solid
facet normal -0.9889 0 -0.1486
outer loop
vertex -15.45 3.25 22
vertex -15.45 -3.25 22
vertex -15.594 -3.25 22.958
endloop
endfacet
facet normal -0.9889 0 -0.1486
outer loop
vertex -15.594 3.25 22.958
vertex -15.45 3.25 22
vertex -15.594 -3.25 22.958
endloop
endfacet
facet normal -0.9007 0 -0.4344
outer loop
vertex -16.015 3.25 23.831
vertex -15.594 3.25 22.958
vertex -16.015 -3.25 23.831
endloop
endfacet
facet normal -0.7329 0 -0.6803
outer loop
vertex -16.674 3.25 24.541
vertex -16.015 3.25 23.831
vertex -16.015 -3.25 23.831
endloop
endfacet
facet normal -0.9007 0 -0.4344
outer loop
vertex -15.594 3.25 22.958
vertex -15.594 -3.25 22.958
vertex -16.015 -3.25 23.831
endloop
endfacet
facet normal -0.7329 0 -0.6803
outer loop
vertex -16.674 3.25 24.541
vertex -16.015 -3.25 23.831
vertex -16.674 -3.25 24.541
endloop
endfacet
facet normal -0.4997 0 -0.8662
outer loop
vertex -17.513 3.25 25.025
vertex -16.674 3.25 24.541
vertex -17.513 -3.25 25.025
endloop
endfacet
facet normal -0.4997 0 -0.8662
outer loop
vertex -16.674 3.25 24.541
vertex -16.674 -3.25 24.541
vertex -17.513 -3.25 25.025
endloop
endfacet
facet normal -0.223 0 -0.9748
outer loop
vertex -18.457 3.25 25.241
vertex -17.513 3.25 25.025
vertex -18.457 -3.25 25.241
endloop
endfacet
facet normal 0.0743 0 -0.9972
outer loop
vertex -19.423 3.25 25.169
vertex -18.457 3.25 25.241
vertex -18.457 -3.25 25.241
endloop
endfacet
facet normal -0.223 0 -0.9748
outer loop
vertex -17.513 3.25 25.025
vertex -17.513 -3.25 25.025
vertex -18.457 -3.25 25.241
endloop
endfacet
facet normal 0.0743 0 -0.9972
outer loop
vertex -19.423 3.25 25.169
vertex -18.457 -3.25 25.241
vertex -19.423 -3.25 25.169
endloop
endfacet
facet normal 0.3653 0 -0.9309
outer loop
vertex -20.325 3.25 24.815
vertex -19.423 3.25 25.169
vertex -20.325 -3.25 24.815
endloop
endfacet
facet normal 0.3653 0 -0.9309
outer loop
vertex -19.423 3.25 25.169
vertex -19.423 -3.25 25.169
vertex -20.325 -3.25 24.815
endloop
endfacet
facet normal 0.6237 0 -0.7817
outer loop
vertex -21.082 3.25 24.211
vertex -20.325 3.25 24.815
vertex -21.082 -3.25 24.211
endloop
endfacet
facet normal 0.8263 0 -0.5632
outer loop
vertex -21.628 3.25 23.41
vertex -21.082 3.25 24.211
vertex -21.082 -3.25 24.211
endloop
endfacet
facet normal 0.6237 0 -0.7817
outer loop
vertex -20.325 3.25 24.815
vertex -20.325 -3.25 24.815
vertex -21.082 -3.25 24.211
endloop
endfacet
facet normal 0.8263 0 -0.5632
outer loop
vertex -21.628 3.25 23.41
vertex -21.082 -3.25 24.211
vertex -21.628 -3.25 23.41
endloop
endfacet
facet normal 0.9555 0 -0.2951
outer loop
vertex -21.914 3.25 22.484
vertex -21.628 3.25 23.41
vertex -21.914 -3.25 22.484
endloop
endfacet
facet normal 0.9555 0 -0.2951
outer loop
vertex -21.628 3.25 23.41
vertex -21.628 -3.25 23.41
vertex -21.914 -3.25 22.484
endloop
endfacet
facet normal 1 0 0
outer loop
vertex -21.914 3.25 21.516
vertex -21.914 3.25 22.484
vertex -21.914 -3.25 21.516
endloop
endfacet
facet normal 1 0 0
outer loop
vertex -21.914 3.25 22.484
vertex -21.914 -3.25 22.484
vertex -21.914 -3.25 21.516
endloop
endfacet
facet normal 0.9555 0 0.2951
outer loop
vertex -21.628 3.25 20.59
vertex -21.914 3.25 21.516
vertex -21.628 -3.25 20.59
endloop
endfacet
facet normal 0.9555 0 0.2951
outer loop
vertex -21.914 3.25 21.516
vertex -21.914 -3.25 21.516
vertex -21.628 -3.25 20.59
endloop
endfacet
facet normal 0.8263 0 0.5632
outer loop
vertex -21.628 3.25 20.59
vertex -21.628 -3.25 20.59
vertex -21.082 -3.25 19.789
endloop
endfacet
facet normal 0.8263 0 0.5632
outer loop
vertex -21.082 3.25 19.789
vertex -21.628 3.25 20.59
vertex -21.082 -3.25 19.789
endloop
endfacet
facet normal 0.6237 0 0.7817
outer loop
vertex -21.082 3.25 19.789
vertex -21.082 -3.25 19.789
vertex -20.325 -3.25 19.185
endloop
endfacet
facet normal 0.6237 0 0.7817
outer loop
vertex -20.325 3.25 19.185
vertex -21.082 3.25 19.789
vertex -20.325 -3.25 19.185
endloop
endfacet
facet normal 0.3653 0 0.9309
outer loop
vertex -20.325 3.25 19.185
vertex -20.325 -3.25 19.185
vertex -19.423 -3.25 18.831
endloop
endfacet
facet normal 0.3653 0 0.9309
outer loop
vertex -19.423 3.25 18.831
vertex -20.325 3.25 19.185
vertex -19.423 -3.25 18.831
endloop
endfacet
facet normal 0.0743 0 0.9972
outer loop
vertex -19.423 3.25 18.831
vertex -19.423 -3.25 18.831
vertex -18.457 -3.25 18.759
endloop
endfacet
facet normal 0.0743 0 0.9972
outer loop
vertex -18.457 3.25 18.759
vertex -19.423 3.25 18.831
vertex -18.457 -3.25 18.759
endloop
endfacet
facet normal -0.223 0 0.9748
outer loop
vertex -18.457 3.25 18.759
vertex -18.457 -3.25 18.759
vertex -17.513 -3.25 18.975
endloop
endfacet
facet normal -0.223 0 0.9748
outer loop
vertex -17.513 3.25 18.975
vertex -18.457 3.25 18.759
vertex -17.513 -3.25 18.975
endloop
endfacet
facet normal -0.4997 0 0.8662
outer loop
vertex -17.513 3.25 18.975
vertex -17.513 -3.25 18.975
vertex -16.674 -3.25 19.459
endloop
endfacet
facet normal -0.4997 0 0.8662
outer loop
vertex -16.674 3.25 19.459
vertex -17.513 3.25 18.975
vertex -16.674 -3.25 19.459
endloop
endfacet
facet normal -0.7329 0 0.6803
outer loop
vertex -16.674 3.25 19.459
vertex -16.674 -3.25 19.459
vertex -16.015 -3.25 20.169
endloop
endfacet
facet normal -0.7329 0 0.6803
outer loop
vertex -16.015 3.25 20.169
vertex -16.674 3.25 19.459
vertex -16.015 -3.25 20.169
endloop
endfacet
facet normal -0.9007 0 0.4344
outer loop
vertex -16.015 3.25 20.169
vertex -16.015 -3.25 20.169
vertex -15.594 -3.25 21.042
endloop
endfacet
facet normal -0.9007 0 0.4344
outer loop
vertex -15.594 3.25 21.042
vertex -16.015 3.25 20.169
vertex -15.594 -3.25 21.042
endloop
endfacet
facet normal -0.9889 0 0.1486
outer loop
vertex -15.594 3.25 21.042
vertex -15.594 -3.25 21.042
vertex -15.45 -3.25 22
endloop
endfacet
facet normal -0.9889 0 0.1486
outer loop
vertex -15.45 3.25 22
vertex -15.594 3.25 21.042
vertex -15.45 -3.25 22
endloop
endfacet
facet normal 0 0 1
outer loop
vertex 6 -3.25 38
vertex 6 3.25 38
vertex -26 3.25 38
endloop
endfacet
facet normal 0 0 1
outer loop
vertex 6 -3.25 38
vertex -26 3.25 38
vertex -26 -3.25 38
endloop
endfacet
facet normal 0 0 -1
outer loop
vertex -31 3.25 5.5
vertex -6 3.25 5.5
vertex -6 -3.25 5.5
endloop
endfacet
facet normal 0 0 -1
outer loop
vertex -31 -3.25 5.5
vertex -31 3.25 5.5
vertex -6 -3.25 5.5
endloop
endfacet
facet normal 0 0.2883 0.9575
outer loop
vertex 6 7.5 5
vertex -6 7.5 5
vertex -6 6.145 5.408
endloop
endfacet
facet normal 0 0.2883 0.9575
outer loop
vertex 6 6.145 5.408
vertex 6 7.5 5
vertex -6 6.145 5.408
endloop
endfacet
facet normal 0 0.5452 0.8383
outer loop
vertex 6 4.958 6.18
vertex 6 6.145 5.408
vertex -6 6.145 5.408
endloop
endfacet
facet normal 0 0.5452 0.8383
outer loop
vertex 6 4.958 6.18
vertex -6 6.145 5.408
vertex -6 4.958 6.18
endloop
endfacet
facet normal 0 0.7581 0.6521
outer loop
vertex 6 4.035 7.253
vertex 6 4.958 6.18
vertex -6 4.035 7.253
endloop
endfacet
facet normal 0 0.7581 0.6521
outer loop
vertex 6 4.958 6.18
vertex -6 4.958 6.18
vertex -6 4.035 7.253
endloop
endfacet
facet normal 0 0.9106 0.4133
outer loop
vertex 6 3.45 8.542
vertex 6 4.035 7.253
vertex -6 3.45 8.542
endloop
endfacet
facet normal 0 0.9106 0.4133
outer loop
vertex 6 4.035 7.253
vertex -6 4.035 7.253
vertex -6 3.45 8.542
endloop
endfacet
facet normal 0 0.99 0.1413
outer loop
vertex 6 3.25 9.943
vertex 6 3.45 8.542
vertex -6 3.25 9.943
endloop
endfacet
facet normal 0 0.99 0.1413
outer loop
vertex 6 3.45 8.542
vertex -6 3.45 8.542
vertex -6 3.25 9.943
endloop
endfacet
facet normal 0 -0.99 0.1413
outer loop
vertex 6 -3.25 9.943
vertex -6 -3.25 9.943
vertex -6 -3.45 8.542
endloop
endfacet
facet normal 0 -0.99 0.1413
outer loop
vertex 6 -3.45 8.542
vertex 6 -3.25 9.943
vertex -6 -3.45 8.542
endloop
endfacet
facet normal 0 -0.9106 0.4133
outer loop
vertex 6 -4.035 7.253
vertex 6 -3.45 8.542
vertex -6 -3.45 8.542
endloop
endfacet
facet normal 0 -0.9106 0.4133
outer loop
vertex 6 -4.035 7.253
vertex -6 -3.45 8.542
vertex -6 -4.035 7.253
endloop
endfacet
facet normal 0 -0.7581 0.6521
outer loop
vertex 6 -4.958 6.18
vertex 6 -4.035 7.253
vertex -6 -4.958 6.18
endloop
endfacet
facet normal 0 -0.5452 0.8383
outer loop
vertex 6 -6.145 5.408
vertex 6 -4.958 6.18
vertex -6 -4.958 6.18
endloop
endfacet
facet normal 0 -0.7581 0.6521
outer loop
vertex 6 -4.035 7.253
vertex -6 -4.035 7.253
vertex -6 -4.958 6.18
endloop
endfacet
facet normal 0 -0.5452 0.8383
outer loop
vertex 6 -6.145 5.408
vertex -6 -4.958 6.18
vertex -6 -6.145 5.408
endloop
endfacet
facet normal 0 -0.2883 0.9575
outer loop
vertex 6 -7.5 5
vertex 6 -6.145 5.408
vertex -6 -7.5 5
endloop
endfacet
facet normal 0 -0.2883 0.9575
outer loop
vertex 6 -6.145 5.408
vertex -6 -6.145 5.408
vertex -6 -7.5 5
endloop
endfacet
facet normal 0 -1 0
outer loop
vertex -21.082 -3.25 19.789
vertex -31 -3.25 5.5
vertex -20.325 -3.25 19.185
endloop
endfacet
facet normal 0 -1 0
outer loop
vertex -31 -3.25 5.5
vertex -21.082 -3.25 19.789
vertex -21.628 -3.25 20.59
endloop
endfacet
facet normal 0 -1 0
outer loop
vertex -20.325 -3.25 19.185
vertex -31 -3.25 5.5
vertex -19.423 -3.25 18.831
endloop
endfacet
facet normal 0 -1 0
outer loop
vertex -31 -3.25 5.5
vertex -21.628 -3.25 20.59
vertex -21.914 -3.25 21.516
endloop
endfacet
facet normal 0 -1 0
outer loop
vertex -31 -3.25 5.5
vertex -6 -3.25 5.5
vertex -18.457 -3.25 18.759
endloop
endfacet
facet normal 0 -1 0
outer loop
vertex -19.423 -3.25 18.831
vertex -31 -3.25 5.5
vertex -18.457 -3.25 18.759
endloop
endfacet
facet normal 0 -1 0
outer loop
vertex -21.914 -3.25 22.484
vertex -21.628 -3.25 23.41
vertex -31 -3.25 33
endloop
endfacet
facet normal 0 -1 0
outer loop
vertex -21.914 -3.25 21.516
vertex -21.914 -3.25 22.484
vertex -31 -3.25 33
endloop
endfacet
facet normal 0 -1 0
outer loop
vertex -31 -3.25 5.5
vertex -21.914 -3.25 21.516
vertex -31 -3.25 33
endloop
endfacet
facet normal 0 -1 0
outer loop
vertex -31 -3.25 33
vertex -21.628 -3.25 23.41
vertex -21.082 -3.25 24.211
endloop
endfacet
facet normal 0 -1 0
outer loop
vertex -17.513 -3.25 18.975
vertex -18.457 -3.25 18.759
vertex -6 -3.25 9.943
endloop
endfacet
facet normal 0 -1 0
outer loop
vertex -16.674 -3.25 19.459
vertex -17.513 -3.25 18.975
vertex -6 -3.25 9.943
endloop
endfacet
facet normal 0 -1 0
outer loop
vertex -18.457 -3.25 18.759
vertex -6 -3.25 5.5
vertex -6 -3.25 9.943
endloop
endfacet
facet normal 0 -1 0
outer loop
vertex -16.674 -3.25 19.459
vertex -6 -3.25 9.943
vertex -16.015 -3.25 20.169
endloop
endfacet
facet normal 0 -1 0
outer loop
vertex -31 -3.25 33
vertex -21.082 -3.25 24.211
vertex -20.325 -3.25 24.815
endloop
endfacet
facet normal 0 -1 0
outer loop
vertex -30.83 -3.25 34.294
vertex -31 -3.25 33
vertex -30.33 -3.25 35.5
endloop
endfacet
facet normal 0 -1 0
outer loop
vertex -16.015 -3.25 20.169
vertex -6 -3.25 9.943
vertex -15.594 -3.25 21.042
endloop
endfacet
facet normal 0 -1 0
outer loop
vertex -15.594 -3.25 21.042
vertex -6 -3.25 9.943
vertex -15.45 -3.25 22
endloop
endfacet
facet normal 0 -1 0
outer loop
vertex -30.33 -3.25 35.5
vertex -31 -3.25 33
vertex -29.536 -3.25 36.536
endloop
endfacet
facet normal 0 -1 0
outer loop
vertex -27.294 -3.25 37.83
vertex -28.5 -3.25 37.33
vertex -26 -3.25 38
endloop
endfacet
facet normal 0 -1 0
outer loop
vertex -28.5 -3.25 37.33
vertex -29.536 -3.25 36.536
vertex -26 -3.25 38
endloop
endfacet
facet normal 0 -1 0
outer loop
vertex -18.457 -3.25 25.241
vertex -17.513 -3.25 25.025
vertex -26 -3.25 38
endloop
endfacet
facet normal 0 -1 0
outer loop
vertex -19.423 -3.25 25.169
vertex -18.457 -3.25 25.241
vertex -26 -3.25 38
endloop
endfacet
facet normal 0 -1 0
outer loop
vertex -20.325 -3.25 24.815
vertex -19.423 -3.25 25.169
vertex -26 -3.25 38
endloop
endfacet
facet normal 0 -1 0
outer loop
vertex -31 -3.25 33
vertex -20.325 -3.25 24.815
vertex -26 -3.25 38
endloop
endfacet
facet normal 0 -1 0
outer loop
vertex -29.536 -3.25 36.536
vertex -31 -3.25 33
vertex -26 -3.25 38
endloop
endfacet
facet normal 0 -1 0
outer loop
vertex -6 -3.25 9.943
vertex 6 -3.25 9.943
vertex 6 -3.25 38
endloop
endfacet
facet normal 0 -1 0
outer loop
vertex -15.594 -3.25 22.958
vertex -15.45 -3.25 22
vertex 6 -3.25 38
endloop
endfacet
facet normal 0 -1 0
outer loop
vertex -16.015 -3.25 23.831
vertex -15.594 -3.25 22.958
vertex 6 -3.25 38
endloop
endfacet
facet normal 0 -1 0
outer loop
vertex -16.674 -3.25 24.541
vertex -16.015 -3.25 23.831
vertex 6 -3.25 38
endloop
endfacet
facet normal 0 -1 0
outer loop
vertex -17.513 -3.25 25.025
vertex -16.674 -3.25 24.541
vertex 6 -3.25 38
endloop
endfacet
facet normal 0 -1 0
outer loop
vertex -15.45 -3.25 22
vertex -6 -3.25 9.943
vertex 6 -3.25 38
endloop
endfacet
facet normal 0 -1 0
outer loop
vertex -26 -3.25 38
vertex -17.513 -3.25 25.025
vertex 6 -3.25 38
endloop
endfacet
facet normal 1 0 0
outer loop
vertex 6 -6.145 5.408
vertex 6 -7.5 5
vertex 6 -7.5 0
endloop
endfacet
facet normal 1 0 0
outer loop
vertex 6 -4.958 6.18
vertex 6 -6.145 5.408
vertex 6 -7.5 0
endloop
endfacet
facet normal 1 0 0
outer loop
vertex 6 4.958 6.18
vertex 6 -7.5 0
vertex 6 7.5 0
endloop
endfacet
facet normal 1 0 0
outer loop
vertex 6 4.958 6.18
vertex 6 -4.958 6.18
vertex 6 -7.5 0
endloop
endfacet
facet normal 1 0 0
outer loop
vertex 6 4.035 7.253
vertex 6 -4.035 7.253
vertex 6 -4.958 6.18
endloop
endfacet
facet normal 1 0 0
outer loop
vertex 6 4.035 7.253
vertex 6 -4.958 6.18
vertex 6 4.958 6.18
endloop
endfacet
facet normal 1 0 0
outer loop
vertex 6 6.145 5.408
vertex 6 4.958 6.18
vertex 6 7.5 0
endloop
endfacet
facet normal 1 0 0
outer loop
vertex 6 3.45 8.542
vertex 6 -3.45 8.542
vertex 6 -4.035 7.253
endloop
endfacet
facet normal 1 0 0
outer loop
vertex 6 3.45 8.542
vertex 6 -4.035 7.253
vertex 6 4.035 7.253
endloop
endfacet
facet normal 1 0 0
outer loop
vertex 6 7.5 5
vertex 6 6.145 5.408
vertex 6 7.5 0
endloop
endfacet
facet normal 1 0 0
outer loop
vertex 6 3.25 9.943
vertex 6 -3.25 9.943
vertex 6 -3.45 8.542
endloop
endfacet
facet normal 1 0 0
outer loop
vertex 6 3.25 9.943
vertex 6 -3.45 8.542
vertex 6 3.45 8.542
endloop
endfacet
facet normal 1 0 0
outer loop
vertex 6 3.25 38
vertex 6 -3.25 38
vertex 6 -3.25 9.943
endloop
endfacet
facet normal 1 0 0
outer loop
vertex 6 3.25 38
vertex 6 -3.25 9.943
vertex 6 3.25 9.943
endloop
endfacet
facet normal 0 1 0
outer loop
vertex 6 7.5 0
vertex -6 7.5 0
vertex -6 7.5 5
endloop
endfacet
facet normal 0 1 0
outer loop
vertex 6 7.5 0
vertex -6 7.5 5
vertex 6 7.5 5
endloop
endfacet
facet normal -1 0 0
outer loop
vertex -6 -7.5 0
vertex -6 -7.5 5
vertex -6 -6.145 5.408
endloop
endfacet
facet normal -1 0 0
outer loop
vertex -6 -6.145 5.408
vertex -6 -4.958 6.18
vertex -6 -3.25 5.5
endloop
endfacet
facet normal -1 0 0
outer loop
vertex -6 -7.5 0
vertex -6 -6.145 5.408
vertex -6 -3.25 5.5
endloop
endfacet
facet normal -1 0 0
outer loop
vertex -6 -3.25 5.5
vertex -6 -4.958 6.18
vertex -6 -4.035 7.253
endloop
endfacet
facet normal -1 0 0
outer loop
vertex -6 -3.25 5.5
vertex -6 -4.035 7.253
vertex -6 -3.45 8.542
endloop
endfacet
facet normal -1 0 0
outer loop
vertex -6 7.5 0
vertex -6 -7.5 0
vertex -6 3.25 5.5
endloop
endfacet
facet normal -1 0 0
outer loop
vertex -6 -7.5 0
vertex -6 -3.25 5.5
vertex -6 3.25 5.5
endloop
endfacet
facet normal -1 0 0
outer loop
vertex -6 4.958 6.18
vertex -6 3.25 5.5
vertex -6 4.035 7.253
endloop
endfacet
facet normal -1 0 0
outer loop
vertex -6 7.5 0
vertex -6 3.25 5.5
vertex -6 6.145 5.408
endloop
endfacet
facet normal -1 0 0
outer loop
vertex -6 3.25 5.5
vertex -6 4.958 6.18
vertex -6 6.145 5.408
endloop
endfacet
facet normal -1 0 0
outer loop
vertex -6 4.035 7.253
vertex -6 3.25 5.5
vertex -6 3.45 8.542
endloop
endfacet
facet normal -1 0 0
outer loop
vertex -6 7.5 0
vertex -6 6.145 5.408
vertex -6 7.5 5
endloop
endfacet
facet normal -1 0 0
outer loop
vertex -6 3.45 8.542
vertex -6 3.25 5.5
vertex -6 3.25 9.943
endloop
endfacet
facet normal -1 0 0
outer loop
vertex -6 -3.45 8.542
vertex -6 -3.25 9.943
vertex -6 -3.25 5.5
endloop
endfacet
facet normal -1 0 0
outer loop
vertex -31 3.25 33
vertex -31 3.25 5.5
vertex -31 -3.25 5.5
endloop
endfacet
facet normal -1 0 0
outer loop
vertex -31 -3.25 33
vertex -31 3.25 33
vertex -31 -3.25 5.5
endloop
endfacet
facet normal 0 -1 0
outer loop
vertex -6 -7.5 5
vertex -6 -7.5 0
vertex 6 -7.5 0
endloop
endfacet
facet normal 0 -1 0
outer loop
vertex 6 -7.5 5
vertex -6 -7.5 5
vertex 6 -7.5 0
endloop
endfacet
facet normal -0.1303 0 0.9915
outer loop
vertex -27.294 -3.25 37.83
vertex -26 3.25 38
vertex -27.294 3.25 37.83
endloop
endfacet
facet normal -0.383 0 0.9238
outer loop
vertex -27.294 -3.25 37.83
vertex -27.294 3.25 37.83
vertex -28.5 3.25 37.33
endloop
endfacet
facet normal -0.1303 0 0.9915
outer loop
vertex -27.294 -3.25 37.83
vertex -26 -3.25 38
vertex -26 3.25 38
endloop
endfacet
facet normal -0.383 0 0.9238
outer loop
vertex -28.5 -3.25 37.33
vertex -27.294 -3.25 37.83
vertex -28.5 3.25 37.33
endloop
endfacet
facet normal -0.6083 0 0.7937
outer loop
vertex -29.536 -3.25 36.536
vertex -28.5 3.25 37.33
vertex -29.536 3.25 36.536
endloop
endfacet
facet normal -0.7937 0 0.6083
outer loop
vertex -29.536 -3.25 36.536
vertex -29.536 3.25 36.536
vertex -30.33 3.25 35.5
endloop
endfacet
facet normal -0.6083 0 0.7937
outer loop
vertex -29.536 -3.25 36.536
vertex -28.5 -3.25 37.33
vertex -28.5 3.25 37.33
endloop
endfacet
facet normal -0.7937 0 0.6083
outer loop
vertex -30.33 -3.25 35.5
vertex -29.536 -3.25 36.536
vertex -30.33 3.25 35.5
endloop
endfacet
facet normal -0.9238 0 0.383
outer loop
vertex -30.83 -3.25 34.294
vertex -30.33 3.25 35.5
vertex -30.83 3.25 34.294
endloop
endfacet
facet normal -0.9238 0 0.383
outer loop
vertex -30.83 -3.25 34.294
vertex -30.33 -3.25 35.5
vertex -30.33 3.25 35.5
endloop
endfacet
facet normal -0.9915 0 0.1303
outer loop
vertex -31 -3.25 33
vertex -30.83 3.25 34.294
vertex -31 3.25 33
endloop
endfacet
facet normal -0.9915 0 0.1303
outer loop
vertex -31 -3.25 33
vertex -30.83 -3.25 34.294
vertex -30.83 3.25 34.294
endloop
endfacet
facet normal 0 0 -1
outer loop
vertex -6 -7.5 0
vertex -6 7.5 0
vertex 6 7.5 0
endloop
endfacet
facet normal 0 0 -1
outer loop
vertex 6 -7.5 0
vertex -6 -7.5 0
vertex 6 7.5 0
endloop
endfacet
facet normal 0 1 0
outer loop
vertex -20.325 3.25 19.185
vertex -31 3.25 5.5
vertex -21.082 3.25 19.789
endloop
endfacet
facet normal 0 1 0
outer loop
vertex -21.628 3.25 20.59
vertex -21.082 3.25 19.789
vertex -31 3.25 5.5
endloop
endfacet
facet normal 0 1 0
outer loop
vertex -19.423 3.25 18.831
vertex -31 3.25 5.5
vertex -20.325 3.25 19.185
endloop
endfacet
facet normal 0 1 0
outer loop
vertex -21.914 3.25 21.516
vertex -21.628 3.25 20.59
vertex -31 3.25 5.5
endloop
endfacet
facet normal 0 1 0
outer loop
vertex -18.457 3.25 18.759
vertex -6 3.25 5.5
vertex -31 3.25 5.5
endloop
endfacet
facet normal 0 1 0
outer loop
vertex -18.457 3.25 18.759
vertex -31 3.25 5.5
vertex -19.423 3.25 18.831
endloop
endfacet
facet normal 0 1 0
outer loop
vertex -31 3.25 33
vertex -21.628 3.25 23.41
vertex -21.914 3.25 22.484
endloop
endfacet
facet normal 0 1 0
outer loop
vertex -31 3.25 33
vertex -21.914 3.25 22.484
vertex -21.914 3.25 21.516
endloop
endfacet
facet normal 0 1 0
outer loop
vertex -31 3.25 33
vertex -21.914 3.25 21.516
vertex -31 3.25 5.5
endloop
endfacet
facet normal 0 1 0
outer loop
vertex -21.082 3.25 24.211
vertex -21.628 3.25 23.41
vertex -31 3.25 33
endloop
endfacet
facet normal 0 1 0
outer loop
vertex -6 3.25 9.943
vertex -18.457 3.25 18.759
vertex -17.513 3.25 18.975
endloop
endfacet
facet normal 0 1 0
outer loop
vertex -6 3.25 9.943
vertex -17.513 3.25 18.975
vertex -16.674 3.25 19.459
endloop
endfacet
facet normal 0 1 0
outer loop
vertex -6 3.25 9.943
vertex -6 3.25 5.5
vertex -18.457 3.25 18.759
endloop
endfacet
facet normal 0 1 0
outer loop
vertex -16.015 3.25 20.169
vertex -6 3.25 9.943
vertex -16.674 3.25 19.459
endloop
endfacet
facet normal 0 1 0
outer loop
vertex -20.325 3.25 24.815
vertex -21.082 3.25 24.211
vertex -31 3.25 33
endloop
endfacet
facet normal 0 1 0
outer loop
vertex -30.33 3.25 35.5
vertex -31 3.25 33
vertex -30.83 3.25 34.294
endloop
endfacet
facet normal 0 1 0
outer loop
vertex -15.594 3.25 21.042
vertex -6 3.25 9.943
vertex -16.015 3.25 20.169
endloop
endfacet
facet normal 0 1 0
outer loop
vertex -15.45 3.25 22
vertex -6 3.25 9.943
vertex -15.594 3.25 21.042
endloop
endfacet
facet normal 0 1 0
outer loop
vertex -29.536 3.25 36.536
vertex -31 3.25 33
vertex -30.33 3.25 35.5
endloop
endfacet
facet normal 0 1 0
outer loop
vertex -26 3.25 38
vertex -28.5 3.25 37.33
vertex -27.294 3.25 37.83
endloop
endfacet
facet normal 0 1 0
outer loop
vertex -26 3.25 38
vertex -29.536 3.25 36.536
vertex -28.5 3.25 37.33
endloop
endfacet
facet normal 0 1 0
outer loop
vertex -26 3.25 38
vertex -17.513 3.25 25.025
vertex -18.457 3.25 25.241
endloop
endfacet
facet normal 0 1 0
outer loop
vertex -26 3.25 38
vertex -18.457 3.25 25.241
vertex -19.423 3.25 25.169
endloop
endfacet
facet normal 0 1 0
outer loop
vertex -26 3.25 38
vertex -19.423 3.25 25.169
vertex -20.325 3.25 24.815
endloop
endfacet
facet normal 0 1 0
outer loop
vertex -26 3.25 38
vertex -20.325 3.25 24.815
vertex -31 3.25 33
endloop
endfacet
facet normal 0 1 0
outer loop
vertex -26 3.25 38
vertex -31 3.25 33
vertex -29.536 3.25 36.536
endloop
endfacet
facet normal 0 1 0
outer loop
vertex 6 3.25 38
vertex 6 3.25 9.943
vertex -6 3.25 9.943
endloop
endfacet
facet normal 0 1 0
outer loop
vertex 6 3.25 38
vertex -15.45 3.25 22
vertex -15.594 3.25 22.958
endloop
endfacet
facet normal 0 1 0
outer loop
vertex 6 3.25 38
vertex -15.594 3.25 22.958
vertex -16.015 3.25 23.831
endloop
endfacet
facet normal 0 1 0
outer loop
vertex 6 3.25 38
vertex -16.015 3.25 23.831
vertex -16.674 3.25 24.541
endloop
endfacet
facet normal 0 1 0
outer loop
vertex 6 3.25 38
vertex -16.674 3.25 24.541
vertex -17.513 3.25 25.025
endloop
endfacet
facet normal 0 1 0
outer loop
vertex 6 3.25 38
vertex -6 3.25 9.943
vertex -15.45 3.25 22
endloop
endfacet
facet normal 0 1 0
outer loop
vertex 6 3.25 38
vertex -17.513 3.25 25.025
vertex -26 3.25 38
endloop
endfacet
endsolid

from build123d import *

# Parameters (mm, degrees)
F0_W        = 12
F0_H        = 15
F1_DEPTH    = 5
F2_W        = 12
F2_H        = 6.5
F3_DEPTH    = 33
F4_W        = 6.5
F4_H        = 33
F5_DEPTH    = 25
F6_T1_DEPTH = 12
F7_R        = 3.25
F8_DEPTH    = 25
F9_W        = 6.5
F9_H        = 0.5
F10_DEPTH   = 25
F11_R       = 5


# Not quite as in the source:
# - a fillet or chamfer that OpenCascade refuses, or shapes differently, is made with other operations: its cross-section is extruded or revolved along the edge and cut away or added


with BuildPart() as f1:
    # F0 (on Top) → F1 (new body)
    with BuildSketch(Plane.XY):
        Rectangle(F0_W, F0_H)
    extrude(amount=F1_DEPTH)

    # F2 (on face) → F3 (join)
    with BuildSketch(Plane.XY.offset(5)):
        Rectangle(F2_W, F2_H)
    extrude(amount=F3_DEPTH)

    # F4 (on face) → F5 (join)
    with BuildSketch(Plane(origin=(-6, 0, 0), x_dir=(0, -1, 0), z_dir=(-1, 0, 0))):
        with Locations((0, 21.5)):
            Rectangle(F4_W, F4_H)
    extrude(amount=F5_DEPTH)

    # F6: fillet of radius 5 on 2 edges, made by hand

    # F6_s2 → F6_t1 (join)
    with BuildSketch(Plane.YZ.offset(-6)):
        with BuildLine():
            ThreePointArc((-3.25, 9.9434299833), (-4.458562278, 6.6838287807), (-7.5, 5))
            Line((-7.5, 5), (-3.25, 5))
            Line((-3.25, 5), (-3.25, 9.9434299833))
        make_face()
        with BuildLine():
            ThreePointArc((7.5, 5), (4.458562278, 6.6838287807), (3.25, 9.9434299833))
            Line((3.25, 9.9434299833), (3.25, 5))
            Line((3.25, 5), (7.5, 5))
        make_face()
    extrude(amount=F6_T1_DEPTH)

    # F7 (on face) → F8 (cut)
    with BuildSketch(Plane.XZ.offset(3.25)):
        with Locations((-18.7, 22)):
            Circle(F7_R)
    extrude(amount=-F8_DEPTH, mode=Mode.SUBTRACT)

    # F9 (on face) → F10 (cut)
    with BuildSketch(Plane(origin=(-31, 0, 0), x_dir=(0, -1, 0), z_dir=(-1, 0, 0))):
        with Locations((0, 5.25)):
            Rectangle(F9_W, F9_H)
    extrude(amount=-F10_DEPTH, mode=Mode.SUBTRACT)

    # F11
    f11_edges = [f1.edges().sort_by_distance(p)[0] for p in [
        (-31, 0, 38),
    ]]
    fillet(f11_edges, radius=F11_R)


solid = f1.part
